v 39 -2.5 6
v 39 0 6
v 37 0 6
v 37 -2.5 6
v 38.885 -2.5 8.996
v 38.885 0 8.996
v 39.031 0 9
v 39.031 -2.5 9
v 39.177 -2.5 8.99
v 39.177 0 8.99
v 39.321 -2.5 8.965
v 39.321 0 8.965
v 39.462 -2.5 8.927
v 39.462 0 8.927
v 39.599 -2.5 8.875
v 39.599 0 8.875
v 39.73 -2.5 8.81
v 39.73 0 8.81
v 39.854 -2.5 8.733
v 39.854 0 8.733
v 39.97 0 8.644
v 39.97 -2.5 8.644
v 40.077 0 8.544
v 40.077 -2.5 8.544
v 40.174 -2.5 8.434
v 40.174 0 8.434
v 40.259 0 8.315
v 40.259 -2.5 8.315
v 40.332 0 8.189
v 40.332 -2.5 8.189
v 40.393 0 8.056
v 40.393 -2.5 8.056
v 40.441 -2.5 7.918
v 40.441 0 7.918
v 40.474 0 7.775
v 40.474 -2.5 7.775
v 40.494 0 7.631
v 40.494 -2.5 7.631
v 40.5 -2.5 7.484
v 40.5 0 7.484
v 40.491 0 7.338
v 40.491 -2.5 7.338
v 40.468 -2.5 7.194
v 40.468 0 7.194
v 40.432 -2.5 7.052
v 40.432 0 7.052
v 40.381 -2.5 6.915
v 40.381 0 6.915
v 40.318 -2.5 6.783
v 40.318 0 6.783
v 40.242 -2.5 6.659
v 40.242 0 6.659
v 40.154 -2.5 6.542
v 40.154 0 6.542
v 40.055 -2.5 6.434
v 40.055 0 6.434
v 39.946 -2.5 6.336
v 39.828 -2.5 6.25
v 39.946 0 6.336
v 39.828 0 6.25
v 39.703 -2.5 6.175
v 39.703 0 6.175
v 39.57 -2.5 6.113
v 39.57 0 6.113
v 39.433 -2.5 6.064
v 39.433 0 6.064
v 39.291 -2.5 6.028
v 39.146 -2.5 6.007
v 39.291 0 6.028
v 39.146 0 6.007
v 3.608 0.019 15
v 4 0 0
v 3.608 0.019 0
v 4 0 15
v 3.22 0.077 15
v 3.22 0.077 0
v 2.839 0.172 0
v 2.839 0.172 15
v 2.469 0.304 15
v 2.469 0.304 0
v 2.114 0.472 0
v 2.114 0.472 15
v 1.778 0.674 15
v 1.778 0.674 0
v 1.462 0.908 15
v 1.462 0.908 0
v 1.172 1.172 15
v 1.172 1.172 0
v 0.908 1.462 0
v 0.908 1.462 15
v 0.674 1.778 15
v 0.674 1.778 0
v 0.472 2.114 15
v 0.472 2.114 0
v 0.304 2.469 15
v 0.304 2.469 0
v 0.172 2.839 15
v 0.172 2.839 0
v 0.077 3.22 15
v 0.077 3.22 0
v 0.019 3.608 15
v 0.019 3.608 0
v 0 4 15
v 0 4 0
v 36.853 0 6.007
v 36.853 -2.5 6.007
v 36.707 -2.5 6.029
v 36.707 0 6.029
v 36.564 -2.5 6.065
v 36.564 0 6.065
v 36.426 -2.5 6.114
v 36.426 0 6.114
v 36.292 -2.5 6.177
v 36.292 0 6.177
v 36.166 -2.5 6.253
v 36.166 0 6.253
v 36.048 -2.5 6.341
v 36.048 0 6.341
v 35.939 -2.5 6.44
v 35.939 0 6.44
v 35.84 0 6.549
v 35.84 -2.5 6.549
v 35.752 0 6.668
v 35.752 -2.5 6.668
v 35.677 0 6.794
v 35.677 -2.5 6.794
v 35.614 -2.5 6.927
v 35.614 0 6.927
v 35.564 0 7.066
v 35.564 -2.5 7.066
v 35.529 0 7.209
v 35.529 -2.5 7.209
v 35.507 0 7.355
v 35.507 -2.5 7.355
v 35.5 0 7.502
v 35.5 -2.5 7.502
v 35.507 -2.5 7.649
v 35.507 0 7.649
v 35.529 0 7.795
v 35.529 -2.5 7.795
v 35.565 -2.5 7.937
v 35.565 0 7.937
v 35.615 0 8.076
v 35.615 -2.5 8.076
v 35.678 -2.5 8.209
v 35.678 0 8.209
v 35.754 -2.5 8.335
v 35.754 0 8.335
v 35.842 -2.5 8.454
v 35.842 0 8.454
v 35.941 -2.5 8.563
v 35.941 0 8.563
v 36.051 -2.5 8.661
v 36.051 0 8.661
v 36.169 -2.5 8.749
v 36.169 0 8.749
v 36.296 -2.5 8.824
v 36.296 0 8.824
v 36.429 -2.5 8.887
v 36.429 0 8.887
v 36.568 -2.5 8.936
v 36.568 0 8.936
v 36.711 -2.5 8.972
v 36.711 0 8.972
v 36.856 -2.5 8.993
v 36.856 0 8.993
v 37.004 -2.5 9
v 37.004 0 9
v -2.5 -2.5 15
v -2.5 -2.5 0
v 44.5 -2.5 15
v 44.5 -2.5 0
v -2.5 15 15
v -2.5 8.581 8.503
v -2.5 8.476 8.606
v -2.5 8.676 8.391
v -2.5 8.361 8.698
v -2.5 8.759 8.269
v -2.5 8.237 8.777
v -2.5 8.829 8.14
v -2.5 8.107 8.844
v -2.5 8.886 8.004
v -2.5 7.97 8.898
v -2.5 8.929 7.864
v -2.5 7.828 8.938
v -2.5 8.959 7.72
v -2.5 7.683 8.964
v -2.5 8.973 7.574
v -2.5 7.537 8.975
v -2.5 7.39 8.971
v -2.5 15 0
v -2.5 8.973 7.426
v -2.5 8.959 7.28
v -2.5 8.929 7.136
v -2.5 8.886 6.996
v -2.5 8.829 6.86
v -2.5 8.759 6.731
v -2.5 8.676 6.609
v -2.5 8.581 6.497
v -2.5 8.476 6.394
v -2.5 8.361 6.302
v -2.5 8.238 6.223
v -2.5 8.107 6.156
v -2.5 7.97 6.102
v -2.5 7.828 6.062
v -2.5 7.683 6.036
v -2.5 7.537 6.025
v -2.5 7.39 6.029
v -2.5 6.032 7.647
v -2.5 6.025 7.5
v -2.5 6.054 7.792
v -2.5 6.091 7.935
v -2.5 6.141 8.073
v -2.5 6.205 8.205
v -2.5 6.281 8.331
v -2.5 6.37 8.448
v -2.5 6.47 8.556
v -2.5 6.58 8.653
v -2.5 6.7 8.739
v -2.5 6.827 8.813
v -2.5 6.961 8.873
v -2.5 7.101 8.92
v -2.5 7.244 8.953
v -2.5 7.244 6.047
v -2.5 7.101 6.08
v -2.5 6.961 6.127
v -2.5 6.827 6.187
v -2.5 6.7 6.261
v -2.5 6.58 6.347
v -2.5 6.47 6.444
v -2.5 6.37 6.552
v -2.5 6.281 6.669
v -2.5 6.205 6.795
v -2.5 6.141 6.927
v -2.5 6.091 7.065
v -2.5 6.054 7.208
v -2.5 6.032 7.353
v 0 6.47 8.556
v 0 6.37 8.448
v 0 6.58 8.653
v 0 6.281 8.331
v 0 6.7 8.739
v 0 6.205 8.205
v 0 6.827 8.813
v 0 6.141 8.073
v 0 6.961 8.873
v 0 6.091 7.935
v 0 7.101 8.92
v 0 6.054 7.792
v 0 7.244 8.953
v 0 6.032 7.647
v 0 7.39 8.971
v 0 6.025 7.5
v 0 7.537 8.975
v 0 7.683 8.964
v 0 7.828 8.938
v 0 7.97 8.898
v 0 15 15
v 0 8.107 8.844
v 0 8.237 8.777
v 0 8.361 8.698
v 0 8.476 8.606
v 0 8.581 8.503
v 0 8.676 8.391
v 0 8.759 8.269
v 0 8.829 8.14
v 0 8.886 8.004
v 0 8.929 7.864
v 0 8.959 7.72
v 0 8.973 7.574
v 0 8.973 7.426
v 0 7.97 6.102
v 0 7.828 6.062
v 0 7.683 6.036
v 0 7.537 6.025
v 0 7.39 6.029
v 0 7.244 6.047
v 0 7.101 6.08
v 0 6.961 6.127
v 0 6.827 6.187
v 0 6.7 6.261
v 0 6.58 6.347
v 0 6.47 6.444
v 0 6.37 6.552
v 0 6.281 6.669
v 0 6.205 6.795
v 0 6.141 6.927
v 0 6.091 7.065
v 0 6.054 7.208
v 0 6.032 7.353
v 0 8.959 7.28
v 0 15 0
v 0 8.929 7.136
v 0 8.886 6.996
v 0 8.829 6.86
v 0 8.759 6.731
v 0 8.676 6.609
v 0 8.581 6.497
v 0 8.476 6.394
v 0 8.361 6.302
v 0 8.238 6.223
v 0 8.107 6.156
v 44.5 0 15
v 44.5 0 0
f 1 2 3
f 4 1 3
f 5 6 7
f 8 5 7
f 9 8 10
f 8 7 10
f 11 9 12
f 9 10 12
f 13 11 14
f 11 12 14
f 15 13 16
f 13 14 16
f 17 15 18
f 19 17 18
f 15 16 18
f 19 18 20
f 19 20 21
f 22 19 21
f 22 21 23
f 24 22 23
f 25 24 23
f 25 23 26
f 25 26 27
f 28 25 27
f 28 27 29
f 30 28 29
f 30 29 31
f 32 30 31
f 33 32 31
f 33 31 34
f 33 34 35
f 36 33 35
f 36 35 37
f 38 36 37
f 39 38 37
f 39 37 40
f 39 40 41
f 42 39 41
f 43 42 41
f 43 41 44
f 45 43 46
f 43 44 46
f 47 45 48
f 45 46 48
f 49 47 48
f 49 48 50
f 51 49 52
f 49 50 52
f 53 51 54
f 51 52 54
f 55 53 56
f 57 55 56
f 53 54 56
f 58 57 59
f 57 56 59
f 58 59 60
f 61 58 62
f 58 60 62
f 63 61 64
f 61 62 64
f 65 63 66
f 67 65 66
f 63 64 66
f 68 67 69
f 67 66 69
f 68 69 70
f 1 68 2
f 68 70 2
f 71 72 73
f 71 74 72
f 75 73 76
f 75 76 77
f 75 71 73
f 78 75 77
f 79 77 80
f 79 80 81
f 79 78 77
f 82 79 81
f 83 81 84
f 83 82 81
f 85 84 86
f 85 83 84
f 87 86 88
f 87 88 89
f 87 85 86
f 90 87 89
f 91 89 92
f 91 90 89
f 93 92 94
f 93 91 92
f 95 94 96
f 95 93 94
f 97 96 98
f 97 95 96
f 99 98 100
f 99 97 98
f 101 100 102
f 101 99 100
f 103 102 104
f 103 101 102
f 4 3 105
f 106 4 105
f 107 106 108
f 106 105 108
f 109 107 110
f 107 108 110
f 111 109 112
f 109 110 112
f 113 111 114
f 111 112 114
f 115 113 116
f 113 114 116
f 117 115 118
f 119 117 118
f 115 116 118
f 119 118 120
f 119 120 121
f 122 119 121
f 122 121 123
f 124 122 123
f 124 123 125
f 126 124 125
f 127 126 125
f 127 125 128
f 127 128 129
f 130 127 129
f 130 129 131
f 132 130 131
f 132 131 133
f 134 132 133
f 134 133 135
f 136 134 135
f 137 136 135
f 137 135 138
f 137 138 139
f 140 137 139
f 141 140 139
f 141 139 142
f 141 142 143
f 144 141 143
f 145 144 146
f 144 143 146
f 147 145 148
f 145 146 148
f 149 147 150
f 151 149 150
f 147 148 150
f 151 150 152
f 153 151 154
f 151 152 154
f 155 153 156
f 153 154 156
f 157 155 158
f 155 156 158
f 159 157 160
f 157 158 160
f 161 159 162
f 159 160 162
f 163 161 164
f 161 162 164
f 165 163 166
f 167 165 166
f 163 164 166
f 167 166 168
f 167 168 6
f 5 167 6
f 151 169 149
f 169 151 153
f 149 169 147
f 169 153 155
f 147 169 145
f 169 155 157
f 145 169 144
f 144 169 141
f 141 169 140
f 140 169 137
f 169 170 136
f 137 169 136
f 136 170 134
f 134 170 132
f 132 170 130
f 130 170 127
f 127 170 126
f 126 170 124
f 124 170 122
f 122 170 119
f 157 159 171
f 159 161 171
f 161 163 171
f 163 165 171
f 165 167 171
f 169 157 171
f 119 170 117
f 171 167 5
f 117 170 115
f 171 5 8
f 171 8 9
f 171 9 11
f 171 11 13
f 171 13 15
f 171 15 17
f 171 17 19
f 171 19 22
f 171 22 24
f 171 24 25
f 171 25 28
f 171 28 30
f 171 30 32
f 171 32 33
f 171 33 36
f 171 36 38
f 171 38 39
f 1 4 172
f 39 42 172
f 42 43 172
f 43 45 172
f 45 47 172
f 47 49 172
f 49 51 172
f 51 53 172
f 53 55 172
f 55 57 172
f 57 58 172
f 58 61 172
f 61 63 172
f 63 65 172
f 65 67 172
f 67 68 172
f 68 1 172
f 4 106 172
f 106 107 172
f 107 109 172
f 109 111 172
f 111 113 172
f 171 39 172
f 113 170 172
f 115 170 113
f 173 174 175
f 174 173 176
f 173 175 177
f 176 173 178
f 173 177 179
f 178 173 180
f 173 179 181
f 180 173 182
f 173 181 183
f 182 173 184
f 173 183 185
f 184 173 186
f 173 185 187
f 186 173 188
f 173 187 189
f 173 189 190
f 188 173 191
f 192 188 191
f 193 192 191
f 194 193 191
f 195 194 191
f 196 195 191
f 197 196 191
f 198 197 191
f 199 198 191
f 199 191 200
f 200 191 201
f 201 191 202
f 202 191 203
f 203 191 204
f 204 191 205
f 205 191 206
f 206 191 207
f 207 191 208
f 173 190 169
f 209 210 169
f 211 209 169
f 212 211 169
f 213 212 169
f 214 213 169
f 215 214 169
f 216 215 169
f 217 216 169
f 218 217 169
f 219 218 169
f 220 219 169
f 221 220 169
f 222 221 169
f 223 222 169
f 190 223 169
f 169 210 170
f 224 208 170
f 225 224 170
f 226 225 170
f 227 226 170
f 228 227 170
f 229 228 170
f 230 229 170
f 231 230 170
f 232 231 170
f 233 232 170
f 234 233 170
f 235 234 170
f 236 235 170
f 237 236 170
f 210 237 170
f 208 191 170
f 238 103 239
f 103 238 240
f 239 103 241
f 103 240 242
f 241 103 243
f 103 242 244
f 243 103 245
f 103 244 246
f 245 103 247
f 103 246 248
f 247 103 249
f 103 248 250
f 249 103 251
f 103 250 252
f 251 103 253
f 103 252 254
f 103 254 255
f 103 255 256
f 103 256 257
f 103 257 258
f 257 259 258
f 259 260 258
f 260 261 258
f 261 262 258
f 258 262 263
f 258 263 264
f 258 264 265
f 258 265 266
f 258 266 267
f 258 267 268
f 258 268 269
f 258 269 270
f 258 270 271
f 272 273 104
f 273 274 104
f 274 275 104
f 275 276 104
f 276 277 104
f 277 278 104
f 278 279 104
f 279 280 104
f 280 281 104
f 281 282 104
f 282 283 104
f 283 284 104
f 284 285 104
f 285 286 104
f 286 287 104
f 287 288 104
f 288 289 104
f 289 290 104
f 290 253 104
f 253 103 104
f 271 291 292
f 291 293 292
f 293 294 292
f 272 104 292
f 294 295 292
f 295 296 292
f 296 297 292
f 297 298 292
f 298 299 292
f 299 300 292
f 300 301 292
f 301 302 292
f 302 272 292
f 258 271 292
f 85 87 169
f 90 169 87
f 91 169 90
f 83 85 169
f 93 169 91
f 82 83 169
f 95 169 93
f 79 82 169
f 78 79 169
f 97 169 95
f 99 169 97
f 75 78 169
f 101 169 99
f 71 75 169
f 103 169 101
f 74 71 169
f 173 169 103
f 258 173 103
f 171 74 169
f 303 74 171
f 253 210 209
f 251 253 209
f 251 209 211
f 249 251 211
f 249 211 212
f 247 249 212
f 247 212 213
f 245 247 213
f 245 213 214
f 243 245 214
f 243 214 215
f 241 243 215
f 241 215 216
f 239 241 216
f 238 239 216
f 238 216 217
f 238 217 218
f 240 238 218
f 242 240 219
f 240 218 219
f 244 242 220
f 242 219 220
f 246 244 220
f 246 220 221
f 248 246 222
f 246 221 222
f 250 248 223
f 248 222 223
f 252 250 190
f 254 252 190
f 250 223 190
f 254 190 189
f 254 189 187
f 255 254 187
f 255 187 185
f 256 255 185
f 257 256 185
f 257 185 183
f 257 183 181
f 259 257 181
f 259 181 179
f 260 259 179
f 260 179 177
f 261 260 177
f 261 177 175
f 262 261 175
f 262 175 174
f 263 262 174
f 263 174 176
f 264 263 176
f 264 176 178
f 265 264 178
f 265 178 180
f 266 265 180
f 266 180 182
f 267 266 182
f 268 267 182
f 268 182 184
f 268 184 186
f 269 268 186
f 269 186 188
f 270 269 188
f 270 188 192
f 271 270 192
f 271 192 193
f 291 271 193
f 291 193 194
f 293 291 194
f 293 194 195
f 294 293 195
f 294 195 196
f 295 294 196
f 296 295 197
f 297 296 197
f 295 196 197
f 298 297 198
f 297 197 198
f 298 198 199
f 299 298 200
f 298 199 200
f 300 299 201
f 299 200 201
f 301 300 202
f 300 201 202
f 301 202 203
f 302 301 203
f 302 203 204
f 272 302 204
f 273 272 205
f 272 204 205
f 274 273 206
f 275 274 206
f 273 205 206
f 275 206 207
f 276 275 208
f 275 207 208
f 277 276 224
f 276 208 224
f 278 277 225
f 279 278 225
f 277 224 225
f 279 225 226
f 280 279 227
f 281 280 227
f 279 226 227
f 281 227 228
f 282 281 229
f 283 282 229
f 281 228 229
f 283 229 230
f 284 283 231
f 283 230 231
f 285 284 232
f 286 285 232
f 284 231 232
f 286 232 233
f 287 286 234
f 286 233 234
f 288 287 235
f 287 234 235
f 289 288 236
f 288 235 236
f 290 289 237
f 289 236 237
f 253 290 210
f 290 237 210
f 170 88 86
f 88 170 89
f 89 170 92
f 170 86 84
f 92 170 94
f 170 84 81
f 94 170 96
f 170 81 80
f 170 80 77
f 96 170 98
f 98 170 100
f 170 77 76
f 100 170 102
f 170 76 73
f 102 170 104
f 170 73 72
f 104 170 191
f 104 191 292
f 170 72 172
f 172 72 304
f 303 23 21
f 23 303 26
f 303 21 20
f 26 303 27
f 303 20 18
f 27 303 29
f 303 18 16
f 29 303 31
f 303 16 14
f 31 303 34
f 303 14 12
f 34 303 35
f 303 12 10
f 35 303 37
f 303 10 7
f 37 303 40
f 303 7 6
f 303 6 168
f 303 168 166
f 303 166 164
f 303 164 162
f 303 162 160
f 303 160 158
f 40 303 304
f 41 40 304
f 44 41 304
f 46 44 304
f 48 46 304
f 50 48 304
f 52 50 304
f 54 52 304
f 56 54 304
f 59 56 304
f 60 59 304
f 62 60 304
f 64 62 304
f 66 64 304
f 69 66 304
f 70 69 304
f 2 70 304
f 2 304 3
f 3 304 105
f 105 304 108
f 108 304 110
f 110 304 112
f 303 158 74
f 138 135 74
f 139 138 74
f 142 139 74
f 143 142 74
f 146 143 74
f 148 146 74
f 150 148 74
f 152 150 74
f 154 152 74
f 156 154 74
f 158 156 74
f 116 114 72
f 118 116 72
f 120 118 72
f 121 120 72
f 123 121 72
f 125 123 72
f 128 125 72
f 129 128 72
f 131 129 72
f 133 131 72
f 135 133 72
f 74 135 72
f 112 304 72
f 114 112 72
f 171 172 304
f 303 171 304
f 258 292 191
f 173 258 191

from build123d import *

# Parameters (mm, degrees)
F1_DEPTH = 15
F3_D     = 2.95
F4_R     = 4
F6_DEPTH = 25


with BuildPart() as f1:
    # F0 (on Top) → F1 (new body)
    with BuildSketch(Plane.XY):
        Polygon((44.5, 0), (0, 0), (0, 15), (-2.5, 15), (-2.5, -2.5), (44.5, -2.5), align=None)
    extrude(amount=F1_DEPTH)

    # F3 (through all)
    with Locations(Plane.YZ):
        with Locations((7.5, 7.5)):
            Hole(F3_D / 2)

    # F4
    f4_edges = [f1.edges().sort_by_distance(p)[0] for p in [
        (0, 0, 7.5),
    ]]
    fillet(f4_edges, radius=F4_R)

    # F5 (on face) → F6 (cut)
    with BuildSketch(Plane(origin=(0, 0, 0), x_dir=(-1, 0, 0), z_dir=(0, 1, 0))):
        with BuildLine():
            Line((-39, 6), (-37, 6))
            ThreePointArc((-37, 6), (-35.500001, 7.501758), (-37.003516, 8.999996))
            Line((-37.003516, 8.999996), (-38.88501, 8.995586))
            ThreePointArc((-38.88501, 8.995586), (-40.498896, 7.557537), (-39, 6))
        make_face()
    extrude(amount=-F6_DEPTH, mode=Mode.SUBTRACT)


solid = f1.part
